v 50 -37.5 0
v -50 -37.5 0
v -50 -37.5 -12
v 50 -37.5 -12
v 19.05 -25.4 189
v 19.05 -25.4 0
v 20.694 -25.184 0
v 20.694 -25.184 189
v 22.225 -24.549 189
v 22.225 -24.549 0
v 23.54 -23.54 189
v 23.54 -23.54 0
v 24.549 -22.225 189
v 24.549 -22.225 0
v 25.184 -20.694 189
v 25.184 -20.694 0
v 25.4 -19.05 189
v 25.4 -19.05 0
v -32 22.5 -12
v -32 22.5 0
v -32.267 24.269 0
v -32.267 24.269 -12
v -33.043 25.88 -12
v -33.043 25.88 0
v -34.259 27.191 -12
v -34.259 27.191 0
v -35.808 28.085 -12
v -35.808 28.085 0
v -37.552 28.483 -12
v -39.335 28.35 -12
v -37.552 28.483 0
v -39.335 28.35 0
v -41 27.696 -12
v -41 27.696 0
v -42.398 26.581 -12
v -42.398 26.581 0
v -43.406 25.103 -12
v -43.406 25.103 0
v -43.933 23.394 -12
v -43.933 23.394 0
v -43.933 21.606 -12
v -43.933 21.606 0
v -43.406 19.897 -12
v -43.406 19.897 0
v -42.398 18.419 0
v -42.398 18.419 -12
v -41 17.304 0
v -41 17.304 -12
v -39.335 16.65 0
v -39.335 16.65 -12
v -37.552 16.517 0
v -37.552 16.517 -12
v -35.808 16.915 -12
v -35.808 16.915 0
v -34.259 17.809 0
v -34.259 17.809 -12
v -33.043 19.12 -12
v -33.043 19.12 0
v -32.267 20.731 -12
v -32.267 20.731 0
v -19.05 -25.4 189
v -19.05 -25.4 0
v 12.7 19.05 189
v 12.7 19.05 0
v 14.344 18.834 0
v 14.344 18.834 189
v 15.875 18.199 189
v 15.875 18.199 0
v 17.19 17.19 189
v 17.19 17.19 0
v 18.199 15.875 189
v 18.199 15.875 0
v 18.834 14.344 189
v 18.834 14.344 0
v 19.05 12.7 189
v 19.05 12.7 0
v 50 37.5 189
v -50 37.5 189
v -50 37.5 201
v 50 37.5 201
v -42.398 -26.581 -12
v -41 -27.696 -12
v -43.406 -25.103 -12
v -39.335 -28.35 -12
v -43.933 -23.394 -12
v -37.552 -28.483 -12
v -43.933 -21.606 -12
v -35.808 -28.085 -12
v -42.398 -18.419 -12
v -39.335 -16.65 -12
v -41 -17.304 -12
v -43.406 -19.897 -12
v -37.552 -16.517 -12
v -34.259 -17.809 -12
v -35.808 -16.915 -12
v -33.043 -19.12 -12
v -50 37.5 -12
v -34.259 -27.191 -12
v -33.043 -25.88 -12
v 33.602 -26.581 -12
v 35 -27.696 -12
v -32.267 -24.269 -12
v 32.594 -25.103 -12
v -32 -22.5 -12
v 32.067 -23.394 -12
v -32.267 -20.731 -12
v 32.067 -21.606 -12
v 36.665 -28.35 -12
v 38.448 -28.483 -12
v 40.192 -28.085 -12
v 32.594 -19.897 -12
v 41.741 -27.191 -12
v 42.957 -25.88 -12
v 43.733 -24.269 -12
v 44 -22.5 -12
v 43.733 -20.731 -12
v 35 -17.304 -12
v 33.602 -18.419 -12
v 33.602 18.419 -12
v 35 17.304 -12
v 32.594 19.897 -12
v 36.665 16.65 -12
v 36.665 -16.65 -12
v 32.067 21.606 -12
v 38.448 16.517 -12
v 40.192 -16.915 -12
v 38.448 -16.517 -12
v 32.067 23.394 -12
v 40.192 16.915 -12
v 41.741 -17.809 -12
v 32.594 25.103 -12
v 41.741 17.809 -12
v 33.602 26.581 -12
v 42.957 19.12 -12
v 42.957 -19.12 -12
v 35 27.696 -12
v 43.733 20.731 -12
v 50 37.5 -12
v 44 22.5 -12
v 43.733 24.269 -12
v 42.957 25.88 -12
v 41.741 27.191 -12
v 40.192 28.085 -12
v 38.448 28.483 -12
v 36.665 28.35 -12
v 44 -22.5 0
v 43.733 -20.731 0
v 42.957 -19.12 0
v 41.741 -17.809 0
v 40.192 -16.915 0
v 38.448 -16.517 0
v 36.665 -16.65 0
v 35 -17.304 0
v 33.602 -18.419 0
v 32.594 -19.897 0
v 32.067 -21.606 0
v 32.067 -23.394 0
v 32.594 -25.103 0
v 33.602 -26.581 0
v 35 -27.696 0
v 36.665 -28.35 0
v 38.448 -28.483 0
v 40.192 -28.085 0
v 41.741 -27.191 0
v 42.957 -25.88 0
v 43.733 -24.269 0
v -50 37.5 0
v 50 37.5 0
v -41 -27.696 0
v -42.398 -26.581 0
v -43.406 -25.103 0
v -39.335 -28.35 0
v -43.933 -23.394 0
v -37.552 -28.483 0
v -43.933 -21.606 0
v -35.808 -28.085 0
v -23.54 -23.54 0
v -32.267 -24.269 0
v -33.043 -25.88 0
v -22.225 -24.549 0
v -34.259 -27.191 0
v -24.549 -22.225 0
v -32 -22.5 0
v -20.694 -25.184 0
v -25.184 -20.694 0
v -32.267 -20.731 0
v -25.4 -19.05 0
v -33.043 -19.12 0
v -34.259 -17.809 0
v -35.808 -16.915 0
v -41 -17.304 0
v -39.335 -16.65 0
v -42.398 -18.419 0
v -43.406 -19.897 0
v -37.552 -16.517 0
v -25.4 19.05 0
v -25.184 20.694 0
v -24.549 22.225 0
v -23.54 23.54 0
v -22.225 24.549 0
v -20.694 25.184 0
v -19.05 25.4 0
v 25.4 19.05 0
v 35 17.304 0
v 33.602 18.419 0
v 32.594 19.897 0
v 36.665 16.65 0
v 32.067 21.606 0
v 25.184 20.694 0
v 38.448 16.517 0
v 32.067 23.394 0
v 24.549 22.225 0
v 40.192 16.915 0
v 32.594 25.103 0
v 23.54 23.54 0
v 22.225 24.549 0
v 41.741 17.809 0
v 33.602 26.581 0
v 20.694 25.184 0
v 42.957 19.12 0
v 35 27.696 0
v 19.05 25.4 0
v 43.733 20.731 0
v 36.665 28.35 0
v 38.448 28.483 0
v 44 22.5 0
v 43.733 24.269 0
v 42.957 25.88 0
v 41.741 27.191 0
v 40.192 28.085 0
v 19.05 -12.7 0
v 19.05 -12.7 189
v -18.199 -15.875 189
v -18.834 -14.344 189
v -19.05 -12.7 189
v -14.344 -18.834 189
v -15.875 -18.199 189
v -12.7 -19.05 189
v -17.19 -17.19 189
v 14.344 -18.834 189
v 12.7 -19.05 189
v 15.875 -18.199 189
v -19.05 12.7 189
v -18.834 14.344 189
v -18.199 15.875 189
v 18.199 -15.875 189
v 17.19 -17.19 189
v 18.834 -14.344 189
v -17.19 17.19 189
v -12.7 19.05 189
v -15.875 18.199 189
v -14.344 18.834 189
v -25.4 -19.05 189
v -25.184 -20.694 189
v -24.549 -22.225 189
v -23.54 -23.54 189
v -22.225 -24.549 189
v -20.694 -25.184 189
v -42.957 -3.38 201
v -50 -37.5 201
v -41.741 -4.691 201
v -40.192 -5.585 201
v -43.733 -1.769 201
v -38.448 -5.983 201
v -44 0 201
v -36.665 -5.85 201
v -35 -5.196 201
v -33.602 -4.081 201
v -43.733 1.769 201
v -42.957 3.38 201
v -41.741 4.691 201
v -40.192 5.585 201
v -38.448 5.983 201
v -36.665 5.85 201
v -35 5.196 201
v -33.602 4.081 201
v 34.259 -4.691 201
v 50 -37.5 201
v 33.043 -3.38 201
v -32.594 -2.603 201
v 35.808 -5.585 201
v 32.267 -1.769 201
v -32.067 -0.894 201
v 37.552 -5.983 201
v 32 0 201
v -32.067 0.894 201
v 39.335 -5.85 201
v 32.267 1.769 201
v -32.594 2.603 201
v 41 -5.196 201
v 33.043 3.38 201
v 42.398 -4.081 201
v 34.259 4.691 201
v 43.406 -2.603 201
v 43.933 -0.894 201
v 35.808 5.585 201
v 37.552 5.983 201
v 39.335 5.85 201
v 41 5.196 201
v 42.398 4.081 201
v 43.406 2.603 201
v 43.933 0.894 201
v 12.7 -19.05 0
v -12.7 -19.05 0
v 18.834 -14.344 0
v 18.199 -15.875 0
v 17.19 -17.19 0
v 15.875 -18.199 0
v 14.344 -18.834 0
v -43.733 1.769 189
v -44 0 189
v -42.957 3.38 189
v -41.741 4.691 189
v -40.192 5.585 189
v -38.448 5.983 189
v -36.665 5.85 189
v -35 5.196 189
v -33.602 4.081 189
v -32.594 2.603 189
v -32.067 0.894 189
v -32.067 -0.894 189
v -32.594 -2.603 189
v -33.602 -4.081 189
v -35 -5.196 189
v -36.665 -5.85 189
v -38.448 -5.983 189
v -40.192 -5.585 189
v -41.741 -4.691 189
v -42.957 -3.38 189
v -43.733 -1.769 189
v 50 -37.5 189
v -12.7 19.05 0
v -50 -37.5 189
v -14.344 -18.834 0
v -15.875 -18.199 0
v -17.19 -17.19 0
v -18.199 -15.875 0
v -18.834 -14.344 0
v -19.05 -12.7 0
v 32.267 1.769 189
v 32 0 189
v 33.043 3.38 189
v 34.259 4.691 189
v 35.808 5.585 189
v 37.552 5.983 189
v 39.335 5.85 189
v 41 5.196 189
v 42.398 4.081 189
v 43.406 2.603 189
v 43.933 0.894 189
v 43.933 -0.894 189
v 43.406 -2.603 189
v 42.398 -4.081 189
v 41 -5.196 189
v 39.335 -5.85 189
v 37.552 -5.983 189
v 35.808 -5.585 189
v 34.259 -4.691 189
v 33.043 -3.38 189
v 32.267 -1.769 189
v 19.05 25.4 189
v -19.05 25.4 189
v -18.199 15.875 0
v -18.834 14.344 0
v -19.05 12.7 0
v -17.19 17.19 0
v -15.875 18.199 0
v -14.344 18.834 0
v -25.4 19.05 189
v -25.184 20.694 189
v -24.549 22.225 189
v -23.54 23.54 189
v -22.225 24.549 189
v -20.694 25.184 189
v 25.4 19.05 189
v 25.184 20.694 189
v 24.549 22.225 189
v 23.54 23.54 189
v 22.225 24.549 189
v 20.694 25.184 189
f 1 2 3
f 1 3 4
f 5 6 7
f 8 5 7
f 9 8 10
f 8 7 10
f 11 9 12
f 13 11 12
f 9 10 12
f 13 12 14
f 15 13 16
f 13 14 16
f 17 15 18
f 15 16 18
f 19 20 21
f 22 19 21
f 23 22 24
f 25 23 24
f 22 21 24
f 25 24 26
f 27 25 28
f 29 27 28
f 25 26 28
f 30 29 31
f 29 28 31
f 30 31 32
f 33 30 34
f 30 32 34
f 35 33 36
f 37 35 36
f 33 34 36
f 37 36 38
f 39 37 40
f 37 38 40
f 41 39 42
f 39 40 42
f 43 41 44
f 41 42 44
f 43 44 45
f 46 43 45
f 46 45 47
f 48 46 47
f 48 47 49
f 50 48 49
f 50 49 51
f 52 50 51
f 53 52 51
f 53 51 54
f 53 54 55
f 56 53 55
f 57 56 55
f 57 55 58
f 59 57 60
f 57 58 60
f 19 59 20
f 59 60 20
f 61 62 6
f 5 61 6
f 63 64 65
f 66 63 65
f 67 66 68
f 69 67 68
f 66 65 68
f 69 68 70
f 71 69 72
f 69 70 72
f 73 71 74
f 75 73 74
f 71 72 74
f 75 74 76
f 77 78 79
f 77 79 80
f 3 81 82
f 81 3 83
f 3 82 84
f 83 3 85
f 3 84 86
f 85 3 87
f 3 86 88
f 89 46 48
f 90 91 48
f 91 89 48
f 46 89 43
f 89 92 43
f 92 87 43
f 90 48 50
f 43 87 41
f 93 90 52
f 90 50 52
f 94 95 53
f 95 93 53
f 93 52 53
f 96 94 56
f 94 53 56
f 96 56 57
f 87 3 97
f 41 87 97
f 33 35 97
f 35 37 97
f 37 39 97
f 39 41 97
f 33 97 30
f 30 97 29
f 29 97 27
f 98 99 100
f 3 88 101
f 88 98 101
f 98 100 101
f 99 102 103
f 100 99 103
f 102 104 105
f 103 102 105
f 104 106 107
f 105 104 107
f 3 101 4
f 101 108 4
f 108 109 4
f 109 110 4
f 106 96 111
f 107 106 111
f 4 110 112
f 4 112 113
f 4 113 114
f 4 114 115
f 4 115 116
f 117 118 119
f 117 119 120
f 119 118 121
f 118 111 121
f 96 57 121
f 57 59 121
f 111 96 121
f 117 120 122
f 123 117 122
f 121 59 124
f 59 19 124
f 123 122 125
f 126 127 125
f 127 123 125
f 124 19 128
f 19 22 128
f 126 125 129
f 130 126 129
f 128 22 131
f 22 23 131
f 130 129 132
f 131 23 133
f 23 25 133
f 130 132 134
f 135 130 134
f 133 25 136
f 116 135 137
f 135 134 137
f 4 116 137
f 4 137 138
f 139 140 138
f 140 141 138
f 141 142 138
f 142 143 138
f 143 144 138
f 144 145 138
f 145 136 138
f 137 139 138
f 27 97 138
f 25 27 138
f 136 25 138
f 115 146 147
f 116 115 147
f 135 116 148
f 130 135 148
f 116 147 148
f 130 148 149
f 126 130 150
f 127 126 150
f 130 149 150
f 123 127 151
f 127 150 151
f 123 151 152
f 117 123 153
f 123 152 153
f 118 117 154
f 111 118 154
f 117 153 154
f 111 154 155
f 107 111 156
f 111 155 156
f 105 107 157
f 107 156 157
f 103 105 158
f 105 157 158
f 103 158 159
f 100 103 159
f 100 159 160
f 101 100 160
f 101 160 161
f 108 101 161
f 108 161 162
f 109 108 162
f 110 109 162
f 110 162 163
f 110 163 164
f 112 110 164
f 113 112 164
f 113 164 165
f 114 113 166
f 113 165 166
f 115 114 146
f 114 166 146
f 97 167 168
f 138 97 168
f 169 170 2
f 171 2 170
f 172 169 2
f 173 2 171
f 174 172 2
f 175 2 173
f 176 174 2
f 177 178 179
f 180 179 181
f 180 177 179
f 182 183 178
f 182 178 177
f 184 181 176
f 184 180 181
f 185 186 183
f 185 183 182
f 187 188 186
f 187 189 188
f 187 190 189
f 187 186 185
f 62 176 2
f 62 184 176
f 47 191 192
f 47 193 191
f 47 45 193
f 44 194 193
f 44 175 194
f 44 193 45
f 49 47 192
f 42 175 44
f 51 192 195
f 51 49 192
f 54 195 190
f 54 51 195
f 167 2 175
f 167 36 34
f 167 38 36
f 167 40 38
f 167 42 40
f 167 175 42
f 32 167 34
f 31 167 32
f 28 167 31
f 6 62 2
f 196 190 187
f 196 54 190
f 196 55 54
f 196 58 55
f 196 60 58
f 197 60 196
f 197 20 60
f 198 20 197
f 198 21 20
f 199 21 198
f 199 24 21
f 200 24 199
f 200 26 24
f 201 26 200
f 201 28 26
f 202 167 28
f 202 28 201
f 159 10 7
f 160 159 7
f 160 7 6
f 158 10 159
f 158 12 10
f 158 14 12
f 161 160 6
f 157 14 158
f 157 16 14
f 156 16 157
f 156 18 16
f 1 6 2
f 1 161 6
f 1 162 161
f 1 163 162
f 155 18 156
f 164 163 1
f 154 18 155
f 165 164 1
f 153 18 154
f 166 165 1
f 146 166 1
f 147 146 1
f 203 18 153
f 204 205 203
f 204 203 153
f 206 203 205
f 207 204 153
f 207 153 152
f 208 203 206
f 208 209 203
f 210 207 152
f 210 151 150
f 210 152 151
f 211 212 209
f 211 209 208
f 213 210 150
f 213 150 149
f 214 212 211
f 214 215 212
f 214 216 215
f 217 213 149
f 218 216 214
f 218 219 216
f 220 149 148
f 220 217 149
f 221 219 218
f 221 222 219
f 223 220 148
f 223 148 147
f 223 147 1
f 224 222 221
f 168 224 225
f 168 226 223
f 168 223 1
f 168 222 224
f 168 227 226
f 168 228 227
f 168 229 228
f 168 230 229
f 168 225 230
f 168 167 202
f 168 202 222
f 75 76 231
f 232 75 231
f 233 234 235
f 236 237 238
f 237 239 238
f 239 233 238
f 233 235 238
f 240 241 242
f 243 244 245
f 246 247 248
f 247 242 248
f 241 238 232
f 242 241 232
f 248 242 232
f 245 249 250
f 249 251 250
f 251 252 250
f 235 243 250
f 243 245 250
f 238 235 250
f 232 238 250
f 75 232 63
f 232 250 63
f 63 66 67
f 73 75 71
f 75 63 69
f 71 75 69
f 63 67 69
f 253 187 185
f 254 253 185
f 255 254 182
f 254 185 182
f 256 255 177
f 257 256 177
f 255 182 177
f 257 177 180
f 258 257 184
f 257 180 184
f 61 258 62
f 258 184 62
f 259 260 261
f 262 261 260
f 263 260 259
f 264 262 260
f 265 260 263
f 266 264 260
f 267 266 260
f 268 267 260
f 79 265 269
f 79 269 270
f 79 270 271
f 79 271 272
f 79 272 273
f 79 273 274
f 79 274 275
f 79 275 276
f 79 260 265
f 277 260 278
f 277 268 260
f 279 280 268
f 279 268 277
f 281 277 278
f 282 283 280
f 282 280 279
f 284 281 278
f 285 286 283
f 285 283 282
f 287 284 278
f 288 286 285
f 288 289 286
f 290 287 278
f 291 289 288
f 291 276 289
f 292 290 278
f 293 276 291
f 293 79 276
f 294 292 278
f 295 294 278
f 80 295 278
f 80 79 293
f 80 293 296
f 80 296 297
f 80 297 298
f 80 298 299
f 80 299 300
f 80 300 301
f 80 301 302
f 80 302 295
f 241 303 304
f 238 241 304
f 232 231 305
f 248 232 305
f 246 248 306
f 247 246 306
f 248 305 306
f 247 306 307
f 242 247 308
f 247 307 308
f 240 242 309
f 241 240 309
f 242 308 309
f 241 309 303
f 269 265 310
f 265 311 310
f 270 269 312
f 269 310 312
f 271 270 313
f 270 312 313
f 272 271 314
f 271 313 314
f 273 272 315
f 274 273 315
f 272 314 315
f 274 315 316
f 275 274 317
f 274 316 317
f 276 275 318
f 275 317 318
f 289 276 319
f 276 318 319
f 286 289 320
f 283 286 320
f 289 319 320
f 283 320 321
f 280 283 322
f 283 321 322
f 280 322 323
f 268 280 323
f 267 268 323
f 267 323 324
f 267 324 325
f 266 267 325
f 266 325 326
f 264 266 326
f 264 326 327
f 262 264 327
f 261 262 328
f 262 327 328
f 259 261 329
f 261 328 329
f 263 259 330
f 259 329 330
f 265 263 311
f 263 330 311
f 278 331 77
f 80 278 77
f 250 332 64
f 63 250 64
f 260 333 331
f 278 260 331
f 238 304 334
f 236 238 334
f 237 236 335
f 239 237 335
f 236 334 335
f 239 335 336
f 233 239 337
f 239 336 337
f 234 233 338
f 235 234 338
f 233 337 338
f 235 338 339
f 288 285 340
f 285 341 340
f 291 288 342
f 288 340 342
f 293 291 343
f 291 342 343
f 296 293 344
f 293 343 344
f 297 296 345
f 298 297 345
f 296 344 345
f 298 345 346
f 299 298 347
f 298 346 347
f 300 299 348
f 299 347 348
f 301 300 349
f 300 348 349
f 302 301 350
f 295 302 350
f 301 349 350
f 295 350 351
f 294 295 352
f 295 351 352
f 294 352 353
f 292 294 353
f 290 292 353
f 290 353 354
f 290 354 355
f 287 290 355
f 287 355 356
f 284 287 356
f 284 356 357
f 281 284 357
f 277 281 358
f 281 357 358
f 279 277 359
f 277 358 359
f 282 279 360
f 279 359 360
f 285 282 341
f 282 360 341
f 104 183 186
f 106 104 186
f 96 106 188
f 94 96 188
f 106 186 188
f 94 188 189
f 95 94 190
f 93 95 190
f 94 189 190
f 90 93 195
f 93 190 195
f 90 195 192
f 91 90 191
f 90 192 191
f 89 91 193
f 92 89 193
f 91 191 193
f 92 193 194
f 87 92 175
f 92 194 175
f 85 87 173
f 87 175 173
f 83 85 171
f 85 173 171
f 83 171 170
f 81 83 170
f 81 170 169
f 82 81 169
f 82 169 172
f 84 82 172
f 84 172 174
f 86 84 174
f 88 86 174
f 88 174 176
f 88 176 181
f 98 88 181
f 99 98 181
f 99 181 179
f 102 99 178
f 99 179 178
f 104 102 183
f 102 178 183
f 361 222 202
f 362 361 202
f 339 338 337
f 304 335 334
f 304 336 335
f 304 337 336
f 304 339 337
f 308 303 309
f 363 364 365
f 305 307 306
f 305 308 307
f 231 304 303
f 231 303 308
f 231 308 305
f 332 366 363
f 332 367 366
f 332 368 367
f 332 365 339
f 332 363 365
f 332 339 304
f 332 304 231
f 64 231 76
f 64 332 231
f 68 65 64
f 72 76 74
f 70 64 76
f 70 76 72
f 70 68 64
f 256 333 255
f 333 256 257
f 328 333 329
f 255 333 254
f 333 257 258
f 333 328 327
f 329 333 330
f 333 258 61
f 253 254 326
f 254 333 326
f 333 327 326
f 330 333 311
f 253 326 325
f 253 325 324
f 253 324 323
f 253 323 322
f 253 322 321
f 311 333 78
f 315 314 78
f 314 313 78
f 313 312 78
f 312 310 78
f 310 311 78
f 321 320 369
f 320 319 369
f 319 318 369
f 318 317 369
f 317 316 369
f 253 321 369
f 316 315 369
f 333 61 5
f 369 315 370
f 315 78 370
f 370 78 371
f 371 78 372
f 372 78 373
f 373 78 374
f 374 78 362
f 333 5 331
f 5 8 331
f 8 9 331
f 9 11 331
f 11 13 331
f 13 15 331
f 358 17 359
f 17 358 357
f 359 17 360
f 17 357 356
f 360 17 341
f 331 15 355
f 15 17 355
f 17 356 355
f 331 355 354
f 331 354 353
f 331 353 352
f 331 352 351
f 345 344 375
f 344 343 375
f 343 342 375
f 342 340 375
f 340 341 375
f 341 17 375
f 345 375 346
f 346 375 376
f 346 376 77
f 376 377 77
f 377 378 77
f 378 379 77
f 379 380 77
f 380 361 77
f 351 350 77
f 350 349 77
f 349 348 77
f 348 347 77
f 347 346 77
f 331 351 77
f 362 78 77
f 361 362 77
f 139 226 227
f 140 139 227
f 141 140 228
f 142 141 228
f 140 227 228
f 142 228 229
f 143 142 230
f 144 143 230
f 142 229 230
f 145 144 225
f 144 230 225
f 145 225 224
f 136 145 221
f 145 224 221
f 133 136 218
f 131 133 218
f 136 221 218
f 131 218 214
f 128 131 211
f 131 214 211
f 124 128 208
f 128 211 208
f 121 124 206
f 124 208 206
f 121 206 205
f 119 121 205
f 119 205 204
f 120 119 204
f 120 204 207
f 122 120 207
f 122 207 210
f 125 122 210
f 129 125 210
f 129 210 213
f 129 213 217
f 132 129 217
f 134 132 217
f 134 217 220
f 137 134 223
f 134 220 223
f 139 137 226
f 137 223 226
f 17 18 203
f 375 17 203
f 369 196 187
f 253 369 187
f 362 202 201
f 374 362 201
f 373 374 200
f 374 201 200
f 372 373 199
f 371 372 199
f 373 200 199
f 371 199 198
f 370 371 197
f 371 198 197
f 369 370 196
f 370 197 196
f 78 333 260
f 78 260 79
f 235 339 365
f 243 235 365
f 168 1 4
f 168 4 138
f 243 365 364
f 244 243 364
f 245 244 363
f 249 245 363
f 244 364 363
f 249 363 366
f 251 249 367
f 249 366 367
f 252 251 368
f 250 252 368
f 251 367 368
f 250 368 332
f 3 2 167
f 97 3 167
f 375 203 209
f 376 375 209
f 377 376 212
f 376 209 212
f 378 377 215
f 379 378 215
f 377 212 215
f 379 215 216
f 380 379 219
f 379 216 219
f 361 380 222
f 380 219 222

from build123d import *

# Parameters (mm, degrees)
F0_W     = 100
F0_H     = 75
F1_DEPTH = 12
F3_DEPTH = 189
F5_W     = 100
F5_H     = 75
F6_DEPTH = 12
F8_D     = 12
F8_DEPTH = 12
F8_TIP   = 3.6051637142
F9_D     = 12
F9_DEPTH = 12
F9_TIP   = 3.6051637142


with BuildPart() as f1:
    # F0 (on Top) → F1 (new body)
    with BuildSketch(Plane.XY):
        Rectangle(F0_W, F0_H)
    extrude(amount=-F1_DEPTH)

    # F2 (on face) → F3 (join)
    with BuildSketch(Plane.XY):
        with BuildLine():
            Line((-19.05, -25.4), (19.05, -25.4))
            ThreePointArc((19.05, -25.4), (23.5401280605, -23.5401280605), (25.4, -19.05))
            Line((25.4, -19.05), (25.4, 19.05))
            ThreePointArc((25.4, 19.05), (23.5401280605, 23.5401280605), (19.05, 25.4))
            Line((19.05, 25.4), (-19.05, 25.4))
            ThreePointArc((-19.05, 25.4), (-23.5401280605, 23.5401280605), (-25.4, 19.05))
            Line((-25.4, 19.05), (-25.4, -19.05))
            ThreePointArc((-25.4, -19.05), (-23.5401280605, -23.5401280605), (-19.05, -25.4))
        make_face()
        with BuildLine():
            Line((-12.7, 19.05), (12.7, 19.05))
            ThreePointArc((12.7, 19.05), (17.1901280605, 17.1901280605), (19.05, 12.7))
            Line((19.05, 12.7), (19.05, -12.7))
            ThreePointArc((19.05, -12.7), (17.1901280605, -17.1901280605), (12.7, -19.05))
            Line((12.7, -19.05), (-12.7, -19.05))
            ThreePointArc((-12.7, -19.05), (-17.1901280605, -17.1901280605), (-19.05, -12.7))
            Line((-19.05, -12.7), (-19.05, 12.7))
            ThreePointArc((-19.05, 12.7), (-17.1901280605, 17.1901280605), (-12.7, 19.05))
        make_face(mode=Mode.SUBTRACT)
    extrude(amount=F3_DEPTH)

    # F5 (on face) → F6 (join)
    with BuildSketch(Plane.XY.offset(189)):
        Rectangle(F5_W, F5_H)
        with BuildLine():
            Line((19.05, -25.4), (-19.05, -25.4))
            ThreePointArc((-19.05, -25.4), (-23.5401280605, -23.5401280605), (-25.4, -19.05))
            Line((-25.4, -19.05), (-25.4, 19.05))
            ThreePointArc((-25.4, 19.05), (-23.5401280605, 23.5401280605), (-19.05, 25.4))
            Line((-19.05, 25.4), (19.05, 25.4))
            ThreePointArc((19.05, 25.4), (23.5401280605, 23.5401280605), (25.4, 19.05))
            Line((25.4, 19.05), (25.4, -19.05))
            ThreePointArc((25.4, -19.05), (23.5401280605, -23.5401280605), (19.05, -25.4))
        make_face(mode=Mode.SUBTRACT)
        with BuildLine():
            ThreePointArc((-25.4, -19.05), (-23.5401280605, -23.5401280605), (-19.05, -25.4))
            Line((-19.05, -25.4), (19.05, -25.4))
            ThreePointArc((19.05, -25.4), (23.5401280605, -23.5401280605), (25.4, -19.05))
            Line((25.4, -19.05), (25.4, 19.05))
            ThreePointArc((25.4, 19.05), (23.5401280605, 23.5401280605), (19.05, 25.4))
            Line((19.05, 25.4), (-19.05, 25.4))
            ThreePointArc((-19.05, 25.4), (-23.5401280605, 23.5401280605), (-25.4, 19.05))
            Line((-25.4, 19.05), (-25.4, -19.05))
        make_face()
        with BuildLine():
            Line((-19.05, -12.7), (-19.05, 12.7))
            ThreePointArc((-19.05, 12.7), (-17.1901280605, 17.1901280605), (-12.7, 19.05))
            Line((-12.7, 19.05), (12.7, 19.05))
            ThreePointArc((12.7, 19.05), (17.1901280605, 17.1901280605), (19.05, 12.7))
            Line((19.05, 12.7), (19.05, -12.7))
            ThreePointArc((19.05, -12.7), (17.1901280605, -17.1901280605), (12.7, -19.05))
            Line((12.7, -19.05), (-12.7, -19.05))
            ThreePointArc((-12.7, -19.05), (-17.1901280605, -17.1901280605), (-19.05, -12.7))
        make_face(mode=Mode.SUBTRACT)
        with BuildLine():
            ThreePointArc((-12.7, 19.05), (-17.1901280605, 17.1901280605), (-19.05, 12.7))
            Line((-19.05, 12.7), (-19.05, -12.7))
            ThreePointArc((-19.05, -12.7), (-17.1901280605, -17.1901280605), (-12.7, -19.05))
            Line((-12.7, -19.05), (12.7, -19.05))
            ThreePointArc((12.7, -19.05), (17.1901280605, -17.1901280605), (19.05, -12.7))
            Line((19.05, -12.7), (19.05, 12.7))
            ThreePointArc((19.05, 12.7), (17.1901280605, 17.1901280605), (12.7, 19.05))
            Line((12.7, 19.05), (-12.7, 19.05))
        make_face()
    extrude(amount=F6_DEPTH)

    # F8
    with Locations(Plane.XY.offset(201)):
        with Locations((-38, 0), (38, 0)):
            Hole(F8_D / 2, depth=F8_DEPTH)
            with Locations((0, 0, -(F8_DEPTH + F8_TIP / 2))):  # 118° drill point
                Cone(0, F8_D / 2, F8_TIP, mode=Mode.SUBTRACT)

    # F9 (one way)
    with BuildSketch(Plane.XY):
        with Locations((-38, 22.5), (38, 22.5), (38, -22.5), (-38, -22.5)):
            Circle(F9_D / 2)
    extrude(amount=-F9_DEPTH, mode=Mode.SUBTRACT)
    with Locations(Plane.XY):
        with Locations((-38, 22.5), (38, 22.5), (38, -22.5), (-38, -22.5)):
            with Locations((0, 0, -(F9_DEPTH + F9_TIP / 2))):  # 118° drill point
                Cone(0, F9_D / 2, F9_TIP, mode=Mode.SUBTRACT)


solid = f1.part
